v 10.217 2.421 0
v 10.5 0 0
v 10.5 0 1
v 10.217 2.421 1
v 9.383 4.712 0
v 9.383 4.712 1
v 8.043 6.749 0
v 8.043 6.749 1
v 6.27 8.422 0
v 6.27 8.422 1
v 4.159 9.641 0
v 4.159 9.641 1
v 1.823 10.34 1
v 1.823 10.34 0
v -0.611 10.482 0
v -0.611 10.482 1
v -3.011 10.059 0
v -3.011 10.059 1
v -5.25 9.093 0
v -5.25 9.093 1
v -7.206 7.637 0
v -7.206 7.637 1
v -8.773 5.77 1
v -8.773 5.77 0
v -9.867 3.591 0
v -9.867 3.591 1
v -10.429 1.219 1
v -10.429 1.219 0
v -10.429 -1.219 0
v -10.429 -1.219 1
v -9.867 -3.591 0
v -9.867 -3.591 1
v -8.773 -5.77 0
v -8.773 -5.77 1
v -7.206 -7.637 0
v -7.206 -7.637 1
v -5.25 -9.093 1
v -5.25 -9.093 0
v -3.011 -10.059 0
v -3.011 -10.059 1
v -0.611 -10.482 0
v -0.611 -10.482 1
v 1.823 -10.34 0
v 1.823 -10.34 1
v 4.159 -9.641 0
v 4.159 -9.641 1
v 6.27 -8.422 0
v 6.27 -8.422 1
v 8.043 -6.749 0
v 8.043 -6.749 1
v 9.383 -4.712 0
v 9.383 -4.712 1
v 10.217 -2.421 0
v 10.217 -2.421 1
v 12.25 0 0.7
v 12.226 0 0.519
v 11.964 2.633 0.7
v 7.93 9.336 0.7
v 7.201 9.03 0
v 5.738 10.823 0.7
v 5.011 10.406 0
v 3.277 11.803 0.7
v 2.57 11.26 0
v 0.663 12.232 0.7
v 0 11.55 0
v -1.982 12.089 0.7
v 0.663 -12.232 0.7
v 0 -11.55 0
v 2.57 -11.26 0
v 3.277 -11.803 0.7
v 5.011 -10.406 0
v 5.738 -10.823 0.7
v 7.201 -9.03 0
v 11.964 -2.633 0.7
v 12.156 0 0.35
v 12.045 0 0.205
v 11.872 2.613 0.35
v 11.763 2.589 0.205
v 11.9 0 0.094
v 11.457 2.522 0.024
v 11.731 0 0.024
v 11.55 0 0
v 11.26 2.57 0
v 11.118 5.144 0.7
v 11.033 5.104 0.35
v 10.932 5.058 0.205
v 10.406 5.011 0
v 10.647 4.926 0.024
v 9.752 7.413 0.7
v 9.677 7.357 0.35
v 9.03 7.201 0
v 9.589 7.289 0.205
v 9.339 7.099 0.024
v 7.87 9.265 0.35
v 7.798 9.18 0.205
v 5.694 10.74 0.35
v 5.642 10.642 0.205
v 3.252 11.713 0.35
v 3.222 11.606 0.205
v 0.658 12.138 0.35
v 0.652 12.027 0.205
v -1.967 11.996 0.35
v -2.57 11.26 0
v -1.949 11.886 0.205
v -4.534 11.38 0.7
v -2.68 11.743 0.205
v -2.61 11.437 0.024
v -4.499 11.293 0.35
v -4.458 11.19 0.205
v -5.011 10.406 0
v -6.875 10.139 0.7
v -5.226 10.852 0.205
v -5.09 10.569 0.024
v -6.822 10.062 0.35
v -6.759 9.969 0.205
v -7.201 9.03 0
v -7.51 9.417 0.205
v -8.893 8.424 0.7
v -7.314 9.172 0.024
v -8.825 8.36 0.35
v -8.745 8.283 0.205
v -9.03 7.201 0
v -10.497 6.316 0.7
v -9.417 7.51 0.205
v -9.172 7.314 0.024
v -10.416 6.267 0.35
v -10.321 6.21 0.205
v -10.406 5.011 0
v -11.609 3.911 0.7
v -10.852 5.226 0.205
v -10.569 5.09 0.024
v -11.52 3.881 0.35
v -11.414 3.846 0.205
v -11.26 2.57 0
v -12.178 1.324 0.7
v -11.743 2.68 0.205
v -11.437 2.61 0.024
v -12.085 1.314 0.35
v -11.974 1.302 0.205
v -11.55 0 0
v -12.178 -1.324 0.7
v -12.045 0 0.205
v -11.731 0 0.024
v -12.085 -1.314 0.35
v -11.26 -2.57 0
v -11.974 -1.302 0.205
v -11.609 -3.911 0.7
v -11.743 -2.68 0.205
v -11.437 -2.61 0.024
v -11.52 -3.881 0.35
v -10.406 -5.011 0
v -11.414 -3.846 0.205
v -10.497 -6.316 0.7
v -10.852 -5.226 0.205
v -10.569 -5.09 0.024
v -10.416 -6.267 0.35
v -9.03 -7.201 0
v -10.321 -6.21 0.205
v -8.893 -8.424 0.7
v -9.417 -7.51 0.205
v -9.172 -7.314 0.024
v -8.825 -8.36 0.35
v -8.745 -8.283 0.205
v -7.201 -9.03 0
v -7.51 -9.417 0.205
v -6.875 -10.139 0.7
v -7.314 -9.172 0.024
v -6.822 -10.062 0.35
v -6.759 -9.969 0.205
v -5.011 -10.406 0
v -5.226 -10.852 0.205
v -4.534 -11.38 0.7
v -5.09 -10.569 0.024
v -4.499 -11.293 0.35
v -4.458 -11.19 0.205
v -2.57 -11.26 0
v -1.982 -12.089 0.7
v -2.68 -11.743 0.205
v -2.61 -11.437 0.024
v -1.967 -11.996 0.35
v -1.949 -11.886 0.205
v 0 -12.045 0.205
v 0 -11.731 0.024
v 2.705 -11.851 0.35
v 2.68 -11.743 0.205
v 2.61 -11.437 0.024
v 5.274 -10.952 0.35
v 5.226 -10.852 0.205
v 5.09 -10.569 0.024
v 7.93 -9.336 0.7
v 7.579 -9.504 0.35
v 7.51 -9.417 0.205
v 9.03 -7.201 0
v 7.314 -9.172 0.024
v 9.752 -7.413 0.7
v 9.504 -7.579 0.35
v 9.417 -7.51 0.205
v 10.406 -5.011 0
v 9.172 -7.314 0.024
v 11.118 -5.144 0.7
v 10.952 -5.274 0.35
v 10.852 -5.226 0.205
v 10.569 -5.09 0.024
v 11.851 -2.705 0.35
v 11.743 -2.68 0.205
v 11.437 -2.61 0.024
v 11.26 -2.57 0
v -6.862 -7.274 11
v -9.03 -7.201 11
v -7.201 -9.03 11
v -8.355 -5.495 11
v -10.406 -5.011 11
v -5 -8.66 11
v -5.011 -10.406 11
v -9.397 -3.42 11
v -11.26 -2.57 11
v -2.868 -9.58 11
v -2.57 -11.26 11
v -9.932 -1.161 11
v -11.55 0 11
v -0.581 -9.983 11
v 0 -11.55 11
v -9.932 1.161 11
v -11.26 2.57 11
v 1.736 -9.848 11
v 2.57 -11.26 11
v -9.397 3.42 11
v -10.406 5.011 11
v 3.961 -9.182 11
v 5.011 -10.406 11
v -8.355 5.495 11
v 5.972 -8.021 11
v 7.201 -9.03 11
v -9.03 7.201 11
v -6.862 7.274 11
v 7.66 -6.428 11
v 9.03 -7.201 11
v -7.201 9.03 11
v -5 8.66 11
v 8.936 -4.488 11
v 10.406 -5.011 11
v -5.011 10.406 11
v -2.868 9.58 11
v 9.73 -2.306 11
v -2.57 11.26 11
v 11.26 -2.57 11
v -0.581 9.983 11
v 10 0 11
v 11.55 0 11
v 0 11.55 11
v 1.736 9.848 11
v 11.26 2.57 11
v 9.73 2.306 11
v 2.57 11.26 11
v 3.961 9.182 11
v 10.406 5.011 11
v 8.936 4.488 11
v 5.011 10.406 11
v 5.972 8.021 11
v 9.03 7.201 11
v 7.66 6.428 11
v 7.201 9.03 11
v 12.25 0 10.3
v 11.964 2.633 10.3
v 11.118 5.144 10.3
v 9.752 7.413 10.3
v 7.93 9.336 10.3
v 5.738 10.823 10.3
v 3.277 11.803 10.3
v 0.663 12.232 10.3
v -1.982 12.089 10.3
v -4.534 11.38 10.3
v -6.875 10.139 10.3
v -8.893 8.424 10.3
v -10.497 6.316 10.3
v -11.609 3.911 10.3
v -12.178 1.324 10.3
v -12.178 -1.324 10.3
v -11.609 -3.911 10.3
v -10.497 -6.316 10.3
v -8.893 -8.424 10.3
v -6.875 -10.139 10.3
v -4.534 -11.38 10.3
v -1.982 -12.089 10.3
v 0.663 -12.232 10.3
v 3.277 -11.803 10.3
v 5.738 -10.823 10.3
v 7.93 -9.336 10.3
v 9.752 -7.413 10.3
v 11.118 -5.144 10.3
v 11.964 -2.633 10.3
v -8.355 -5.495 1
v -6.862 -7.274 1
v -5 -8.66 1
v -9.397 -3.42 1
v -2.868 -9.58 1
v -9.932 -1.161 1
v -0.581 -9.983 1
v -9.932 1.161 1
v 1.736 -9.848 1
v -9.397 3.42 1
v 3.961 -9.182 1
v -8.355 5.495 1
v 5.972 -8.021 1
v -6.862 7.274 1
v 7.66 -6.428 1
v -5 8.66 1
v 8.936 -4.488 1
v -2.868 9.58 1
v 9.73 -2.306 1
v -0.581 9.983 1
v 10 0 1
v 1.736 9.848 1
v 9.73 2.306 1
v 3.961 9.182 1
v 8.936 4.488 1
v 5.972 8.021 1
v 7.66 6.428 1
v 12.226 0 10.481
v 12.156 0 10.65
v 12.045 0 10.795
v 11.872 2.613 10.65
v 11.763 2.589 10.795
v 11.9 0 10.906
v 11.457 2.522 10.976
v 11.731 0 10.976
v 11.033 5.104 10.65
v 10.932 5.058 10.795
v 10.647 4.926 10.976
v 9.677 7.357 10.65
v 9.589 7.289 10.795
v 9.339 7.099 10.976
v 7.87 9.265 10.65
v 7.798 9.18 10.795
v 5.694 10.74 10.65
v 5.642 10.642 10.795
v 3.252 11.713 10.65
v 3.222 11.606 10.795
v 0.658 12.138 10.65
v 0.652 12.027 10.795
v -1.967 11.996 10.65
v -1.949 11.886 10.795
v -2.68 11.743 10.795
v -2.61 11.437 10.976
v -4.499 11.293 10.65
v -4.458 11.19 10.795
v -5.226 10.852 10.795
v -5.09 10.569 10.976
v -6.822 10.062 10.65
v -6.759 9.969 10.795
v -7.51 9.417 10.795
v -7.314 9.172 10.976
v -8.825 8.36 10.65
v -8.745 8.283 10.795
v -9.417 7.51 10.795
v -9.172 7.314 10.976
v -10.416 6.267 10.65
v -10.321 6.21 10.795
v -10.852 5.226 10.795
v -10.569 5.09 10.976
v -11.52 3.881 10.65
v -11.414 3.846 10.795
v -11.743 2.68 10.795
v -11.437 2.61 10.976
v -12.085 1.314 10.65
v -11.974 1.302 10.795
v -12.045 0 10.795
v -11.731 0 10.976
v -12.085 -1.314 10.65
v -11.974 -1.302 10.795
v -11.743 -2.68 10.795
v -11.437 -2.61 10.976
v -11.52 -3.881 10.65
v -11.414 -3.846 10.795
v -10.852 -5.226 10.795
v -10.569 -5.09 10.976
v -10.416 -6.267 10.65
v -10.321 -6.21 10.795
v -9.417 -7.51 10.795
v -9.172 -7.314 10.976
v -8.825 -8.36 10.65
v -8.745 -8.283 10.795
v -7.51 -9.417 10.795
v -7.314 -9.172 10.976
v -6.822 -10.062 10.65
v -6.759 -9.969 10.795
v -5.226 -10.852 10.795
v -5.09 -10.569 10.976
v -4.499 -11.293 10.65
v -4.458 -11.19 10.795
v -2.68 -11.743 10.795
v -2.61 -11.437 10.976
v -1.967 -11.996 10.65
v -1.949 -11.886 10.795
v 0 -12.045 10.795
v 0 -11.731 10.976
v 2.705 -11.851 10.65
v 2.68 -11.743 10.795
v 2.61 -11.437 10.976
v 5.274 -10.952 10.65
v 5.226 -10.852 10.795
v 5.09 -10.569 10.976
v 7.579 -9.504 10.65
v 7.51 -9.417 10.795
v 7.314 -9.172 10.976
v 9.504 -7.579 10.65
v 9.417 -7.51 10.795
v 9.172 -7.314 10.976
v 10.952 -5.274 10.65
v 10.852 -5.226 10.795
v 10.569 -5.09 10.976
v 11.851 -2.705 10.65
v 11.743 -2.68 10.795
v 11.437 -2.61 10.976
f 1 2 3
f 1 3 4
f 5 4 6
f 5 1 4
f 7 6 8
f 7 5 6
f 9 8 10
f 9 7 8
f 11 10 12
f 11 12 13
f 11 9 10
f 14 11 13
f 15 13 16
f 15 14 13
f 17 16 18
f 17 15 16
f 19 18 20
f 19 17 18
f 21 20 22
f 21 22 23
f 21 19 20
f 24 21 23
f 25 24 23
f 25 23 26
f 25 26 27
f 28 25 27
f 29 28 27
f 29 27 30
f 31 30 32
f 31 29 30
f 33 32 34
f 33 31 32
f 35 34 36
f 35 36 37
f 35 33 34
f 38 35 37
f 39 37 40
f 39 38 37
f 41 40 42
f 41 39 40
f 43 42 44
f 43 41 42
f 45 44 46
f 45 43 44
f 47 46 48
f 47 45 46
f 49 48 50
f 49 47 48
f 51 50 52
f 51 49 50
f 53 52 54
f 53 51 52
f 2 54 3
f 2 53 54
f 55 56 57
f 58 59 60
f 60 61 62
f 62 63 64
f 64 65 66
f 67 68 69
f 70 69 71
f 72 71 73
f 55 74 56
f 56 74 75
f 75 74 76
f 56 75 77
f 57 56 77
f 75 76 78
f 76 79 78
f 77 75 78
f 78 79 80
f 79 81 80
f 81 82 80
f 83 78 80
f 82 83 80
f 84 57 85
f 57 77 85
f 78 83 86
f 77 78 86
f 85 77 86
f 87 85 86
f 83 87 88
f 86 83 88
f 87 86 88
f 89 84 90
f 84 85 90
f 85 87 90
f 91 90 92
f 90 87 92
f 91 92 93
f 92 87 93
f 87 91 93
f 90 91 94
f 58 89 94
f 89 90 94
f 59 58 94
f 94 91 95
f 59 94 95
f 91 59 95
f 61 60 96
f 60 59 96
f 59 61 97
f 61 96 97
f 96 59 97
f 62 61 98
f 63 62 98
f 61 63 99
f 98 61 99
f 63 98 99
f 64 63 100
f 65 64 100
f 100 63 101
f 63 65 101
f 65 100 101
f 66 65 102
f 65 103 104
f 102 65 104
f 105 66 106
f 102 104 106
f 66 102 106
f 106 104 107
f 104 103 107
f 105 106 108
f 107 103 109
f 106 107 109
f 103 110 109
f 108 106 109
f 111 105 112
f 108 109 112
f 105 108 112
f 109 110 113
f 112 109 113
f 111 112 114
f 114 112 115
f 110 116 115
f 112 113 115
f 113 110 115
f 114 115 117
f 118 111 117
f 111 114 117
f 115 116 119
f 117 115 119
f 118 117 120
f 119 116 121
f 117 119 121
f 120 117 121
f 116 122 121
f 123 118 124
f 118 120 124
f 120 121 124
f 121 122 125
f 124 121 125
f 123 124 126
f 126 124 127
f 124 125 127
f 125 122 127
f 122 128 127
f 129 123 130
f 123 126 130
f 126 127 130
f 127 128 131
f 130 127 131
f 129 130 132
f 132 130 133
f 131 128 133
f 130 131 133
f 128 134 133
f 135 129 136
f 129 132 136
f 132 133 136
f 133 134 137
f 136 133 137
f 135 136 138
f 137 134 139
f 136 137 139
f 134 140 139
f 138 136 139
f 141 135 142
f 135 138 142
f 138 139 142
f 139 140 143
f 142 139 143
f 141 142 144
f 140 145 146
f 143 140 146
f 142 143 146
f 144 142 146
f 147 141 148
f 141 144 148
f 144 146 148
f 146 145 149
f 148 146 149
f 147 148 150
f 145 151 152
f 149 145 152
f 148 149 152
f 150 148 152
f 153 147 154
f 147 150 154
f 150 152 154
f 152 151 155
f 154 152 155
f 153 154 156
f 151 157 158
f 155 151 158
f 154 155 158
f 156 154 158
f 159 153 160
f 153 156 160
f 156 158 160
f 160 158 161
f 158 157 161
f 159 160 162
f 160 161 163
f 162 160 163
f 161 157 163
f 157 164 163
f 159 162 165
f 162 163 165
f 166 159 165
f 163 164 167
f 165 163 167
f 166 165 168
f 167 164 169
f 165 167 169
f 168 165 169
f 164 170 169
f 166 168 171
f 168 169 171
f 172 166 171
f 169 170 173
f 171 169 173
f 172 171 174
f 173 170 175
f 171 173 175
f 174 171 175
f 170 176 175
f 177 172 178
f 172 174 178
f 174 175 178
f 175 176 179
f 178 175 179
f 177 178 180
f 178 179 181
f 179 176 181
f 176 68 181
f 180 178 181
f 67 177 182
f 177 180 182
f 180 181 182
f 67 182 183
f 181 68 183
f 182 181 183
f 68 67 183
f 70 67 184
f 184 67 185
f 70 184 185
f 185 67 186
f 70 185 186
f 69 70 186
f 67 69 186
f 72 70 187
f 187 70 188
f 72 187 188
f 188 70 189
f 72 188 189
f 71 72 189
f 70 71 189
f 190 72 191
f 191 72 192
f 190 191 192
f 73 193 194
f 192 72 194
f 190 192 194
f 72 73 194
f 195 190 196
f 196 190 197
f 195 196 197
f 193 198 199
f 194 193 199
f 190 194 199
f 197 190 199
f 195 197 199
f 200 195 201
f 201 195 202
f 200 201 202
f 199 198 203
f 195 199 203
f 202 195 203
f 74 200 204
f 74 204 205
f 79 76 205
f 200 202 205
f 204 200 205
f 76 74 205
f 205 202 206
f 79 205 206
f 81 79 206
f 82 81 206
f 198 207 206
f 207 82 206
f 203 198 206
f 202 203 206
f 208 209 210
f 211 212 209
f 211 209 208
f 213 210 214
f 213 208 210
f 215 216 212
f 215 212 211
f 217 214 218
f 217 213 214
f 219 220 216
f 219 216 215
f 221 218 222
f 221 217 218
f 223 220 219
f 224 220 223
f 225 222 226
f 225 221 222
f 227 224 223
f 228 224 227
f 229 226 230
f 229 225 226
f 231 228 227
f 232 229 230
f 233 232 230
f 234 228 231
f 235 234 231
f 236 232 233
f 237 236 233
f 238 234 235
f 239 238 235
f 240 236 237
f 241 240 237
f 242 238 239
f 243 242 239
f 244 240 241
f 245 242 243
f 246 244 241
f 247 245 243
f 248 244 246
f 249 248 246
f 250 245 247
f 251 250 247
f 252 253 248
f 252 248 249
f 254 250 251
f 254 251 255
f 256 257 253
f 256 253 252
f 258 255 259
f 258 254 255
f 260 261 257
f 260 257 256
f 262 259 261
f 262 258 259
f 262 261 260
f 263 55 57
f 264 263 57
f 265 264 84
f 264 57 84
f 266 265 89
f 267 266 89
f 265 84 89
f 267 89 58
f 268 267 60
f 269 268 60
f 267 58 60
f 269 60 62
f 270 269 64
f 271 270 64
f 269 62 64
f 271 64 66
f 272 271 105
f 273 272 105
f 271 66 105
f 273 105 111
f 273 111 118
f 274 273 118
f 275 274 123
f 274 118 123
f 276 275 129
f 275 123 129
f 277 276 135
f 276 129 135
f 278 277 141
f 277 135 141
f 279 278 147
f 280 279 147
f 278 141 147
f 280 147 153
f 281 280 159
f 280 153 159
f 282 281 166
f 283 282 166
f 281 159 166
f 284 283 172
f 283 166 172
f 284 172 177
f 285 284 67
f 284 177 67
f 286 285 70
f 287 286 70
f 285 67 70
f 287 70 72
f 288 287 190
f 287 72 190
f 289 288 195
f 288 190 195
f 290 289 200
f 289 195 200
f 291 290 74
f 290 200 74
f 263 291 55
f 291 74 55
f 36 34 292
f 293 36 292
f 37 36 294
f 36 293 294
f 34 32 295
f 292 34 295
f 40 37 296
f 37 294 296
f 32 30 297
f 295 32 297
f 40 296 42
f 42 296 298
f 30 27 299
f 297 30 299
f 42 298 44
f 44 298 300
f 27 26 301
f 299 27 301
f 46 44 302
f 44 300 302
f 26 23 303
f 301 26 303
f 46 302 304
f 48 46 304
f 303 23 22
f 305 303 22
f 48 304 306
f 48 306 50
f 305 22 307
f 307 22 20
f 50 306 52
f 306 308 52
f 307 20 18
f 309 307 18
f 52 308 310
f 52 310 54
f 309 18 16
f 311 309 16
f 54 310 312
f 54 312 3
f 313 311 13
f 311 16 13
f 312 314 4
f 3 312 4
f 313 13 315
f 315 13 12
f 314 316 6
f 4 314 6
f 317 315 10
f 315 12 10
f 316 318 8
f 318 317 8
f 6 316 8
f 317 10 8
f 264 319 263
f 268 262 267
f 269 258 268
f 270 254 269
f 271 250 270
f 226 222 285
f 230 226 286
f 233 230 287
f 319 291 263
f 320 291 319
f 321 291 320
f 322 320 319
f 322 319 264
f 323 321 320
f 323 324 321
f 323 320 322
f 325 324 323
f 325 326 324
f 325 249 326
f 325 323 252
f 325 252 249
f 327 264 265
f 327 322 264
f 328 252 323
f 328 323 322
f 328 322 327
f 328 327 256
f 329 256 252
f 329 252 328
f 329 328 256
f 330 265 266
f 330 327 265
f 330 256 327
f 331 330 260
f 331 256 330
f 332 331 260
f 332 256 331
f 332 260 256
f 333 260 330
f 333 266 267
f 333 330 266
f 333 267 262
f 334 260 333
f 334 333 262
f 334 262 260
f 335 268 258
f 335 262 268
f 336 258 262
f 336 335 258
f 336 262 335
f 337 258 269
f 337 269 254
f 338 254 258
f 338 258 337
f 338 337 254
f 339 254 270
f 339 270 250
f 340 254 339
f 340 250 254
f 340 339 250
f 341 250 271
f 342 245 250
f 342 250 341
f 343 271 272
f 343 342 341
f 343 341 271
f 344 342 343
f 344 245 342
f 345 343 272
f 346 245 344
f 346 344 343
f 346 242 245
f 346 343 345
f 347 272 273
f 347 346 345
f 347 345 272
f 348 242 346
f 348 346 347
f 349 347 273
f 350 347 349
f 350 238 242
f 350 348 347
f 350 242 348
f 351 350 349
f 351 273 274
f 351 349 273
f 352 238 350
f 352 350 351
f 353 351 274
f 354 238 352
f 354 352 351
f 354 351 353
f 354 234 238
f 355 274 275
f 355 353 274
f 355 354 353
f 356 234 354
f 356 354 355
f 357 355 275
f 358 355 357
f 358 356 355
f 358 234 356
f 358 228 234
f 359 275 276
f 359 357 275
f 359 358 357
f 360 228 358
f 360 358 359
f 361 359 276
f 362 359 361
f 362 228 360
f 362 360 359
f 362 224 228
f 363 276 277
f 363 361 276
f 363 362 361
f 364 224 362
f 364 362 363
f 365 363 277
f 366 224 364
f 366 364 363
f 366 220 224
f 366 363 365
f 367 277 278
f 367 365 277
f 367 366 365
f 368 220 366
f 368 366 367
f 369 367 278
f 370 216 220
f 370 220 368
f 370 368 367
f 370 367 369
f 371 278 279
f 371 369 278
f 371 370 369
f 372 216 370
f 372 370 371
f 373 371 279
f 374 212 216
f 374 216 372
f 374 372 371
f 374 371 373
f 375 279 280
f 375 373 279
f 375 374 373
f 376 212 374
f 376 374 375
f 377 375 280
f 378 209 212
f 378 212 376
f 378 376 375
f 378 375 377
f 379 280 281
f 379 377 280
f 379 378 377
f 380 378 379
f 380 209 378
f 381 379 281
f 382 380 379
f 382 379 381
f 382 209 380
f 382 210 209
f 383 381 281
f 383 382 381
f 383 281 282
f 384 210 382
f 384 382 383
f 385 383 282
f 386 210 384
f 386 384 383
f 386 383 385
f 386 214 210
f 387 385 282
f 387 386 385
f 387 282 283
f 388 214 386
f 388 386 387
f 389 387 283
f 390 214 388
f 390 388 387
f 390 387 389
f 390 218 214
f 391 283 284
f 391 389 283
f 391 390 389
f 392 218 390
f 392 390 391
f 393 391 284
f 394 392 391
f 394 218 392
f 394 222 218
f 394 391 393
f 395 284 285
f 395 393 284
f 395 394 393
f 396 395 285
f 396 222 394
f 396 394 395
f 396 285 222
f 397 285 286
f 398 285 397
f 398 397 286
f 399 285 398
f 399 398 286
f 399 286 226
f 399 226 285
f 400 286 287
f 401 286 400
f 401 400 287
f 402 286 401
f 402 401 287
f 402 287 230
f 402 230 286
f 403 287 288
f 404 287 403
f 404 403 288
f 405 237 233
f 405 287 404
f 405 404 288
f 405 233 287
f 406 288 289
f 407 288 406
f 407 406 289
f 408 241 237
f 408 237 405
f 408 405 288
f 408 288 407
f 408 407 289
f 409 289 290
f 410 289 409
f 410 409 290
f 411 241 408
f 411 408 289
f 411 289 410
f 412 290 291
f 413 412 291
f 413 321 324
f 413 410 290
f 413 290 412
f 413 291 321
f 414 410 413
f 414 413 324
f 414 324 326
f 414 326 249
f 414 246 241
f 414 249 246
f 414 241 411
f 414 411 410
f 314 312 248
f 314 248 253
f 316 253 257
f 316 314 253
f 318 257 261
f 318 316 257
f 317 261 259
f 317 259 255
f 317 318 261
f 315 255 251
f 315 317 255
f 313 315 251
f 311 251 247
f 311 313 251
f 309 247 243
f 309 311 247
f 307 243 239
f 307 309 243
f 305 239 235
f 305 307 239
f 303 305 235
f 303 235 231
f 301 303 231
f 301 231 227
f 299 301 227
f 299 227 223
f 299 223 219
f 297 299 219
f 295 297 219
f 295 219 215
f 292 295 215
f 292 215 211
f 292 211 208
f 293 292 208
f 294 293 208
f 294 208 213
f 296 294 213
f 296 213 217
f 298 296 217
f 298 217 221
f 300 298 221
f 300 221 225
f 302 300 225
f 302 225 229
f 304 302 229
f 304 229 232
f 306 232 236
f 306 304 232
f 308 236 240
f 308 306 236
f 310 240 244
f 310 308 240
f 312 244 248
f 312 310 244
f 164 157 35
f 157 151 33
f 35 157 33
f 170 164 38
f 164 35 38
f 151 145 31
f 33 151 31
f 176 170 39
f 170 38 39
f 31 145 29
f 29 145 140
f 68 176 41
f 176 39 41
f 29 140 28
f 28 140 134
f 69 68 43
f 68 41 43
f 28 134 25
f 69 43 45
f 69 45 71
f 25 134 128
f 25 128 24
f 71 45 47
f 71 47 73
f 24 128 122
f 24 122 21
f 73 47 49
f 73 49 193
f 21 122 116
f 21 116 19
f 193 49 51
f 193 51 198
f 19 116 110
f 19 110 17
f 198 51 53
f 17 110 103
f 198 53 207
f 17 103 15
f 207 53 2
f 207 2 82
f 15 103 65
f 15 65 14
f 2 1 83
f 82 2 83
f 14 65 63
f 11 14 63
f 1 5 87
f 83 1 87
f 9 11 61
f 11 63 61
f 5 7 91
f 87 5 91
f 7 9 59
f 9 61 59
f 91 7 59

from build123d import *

# Parameters (mm, degrees)
F0_R     = 12.25
F0_R_2   = 10.5
F0_R_3   = 10
F1_DEPTH = 11
F2_DEPTH = 1
F3_R     = 0.7


with BuildPart() as f1:
    # F0 (on Top) → F1 (new body)
    with BuildSketch(Plane.XY):
        Circle(F0_R)
        Circle(F0_R_2, mode=Mode.SUBTRACT)
        Circle(F0_R_2)
        Circle(F0_R_3, mode=Mode.SUBTRACT)
    extrude(amount=F1_DEPTH)

    # F0 (on Top) → F2 (cut)
    with BuildSketch(Plane.XY):
        Circle(F0_R_2)
        Circle(F0_R_3, mode=Mode.SUBTRACT)
    extrude(amount=F2_DEPTH, mode=Mode.SUBTRACT)

    # F3
    f3_edges = [f1.edges().sort_by_distance(p)[0] for p in [
        (-12.25, 0, 0),
        (-12.25, 0, 11),
    ]]
    fillet(f3_edges, radius=F3_R)


solid = f1.part
